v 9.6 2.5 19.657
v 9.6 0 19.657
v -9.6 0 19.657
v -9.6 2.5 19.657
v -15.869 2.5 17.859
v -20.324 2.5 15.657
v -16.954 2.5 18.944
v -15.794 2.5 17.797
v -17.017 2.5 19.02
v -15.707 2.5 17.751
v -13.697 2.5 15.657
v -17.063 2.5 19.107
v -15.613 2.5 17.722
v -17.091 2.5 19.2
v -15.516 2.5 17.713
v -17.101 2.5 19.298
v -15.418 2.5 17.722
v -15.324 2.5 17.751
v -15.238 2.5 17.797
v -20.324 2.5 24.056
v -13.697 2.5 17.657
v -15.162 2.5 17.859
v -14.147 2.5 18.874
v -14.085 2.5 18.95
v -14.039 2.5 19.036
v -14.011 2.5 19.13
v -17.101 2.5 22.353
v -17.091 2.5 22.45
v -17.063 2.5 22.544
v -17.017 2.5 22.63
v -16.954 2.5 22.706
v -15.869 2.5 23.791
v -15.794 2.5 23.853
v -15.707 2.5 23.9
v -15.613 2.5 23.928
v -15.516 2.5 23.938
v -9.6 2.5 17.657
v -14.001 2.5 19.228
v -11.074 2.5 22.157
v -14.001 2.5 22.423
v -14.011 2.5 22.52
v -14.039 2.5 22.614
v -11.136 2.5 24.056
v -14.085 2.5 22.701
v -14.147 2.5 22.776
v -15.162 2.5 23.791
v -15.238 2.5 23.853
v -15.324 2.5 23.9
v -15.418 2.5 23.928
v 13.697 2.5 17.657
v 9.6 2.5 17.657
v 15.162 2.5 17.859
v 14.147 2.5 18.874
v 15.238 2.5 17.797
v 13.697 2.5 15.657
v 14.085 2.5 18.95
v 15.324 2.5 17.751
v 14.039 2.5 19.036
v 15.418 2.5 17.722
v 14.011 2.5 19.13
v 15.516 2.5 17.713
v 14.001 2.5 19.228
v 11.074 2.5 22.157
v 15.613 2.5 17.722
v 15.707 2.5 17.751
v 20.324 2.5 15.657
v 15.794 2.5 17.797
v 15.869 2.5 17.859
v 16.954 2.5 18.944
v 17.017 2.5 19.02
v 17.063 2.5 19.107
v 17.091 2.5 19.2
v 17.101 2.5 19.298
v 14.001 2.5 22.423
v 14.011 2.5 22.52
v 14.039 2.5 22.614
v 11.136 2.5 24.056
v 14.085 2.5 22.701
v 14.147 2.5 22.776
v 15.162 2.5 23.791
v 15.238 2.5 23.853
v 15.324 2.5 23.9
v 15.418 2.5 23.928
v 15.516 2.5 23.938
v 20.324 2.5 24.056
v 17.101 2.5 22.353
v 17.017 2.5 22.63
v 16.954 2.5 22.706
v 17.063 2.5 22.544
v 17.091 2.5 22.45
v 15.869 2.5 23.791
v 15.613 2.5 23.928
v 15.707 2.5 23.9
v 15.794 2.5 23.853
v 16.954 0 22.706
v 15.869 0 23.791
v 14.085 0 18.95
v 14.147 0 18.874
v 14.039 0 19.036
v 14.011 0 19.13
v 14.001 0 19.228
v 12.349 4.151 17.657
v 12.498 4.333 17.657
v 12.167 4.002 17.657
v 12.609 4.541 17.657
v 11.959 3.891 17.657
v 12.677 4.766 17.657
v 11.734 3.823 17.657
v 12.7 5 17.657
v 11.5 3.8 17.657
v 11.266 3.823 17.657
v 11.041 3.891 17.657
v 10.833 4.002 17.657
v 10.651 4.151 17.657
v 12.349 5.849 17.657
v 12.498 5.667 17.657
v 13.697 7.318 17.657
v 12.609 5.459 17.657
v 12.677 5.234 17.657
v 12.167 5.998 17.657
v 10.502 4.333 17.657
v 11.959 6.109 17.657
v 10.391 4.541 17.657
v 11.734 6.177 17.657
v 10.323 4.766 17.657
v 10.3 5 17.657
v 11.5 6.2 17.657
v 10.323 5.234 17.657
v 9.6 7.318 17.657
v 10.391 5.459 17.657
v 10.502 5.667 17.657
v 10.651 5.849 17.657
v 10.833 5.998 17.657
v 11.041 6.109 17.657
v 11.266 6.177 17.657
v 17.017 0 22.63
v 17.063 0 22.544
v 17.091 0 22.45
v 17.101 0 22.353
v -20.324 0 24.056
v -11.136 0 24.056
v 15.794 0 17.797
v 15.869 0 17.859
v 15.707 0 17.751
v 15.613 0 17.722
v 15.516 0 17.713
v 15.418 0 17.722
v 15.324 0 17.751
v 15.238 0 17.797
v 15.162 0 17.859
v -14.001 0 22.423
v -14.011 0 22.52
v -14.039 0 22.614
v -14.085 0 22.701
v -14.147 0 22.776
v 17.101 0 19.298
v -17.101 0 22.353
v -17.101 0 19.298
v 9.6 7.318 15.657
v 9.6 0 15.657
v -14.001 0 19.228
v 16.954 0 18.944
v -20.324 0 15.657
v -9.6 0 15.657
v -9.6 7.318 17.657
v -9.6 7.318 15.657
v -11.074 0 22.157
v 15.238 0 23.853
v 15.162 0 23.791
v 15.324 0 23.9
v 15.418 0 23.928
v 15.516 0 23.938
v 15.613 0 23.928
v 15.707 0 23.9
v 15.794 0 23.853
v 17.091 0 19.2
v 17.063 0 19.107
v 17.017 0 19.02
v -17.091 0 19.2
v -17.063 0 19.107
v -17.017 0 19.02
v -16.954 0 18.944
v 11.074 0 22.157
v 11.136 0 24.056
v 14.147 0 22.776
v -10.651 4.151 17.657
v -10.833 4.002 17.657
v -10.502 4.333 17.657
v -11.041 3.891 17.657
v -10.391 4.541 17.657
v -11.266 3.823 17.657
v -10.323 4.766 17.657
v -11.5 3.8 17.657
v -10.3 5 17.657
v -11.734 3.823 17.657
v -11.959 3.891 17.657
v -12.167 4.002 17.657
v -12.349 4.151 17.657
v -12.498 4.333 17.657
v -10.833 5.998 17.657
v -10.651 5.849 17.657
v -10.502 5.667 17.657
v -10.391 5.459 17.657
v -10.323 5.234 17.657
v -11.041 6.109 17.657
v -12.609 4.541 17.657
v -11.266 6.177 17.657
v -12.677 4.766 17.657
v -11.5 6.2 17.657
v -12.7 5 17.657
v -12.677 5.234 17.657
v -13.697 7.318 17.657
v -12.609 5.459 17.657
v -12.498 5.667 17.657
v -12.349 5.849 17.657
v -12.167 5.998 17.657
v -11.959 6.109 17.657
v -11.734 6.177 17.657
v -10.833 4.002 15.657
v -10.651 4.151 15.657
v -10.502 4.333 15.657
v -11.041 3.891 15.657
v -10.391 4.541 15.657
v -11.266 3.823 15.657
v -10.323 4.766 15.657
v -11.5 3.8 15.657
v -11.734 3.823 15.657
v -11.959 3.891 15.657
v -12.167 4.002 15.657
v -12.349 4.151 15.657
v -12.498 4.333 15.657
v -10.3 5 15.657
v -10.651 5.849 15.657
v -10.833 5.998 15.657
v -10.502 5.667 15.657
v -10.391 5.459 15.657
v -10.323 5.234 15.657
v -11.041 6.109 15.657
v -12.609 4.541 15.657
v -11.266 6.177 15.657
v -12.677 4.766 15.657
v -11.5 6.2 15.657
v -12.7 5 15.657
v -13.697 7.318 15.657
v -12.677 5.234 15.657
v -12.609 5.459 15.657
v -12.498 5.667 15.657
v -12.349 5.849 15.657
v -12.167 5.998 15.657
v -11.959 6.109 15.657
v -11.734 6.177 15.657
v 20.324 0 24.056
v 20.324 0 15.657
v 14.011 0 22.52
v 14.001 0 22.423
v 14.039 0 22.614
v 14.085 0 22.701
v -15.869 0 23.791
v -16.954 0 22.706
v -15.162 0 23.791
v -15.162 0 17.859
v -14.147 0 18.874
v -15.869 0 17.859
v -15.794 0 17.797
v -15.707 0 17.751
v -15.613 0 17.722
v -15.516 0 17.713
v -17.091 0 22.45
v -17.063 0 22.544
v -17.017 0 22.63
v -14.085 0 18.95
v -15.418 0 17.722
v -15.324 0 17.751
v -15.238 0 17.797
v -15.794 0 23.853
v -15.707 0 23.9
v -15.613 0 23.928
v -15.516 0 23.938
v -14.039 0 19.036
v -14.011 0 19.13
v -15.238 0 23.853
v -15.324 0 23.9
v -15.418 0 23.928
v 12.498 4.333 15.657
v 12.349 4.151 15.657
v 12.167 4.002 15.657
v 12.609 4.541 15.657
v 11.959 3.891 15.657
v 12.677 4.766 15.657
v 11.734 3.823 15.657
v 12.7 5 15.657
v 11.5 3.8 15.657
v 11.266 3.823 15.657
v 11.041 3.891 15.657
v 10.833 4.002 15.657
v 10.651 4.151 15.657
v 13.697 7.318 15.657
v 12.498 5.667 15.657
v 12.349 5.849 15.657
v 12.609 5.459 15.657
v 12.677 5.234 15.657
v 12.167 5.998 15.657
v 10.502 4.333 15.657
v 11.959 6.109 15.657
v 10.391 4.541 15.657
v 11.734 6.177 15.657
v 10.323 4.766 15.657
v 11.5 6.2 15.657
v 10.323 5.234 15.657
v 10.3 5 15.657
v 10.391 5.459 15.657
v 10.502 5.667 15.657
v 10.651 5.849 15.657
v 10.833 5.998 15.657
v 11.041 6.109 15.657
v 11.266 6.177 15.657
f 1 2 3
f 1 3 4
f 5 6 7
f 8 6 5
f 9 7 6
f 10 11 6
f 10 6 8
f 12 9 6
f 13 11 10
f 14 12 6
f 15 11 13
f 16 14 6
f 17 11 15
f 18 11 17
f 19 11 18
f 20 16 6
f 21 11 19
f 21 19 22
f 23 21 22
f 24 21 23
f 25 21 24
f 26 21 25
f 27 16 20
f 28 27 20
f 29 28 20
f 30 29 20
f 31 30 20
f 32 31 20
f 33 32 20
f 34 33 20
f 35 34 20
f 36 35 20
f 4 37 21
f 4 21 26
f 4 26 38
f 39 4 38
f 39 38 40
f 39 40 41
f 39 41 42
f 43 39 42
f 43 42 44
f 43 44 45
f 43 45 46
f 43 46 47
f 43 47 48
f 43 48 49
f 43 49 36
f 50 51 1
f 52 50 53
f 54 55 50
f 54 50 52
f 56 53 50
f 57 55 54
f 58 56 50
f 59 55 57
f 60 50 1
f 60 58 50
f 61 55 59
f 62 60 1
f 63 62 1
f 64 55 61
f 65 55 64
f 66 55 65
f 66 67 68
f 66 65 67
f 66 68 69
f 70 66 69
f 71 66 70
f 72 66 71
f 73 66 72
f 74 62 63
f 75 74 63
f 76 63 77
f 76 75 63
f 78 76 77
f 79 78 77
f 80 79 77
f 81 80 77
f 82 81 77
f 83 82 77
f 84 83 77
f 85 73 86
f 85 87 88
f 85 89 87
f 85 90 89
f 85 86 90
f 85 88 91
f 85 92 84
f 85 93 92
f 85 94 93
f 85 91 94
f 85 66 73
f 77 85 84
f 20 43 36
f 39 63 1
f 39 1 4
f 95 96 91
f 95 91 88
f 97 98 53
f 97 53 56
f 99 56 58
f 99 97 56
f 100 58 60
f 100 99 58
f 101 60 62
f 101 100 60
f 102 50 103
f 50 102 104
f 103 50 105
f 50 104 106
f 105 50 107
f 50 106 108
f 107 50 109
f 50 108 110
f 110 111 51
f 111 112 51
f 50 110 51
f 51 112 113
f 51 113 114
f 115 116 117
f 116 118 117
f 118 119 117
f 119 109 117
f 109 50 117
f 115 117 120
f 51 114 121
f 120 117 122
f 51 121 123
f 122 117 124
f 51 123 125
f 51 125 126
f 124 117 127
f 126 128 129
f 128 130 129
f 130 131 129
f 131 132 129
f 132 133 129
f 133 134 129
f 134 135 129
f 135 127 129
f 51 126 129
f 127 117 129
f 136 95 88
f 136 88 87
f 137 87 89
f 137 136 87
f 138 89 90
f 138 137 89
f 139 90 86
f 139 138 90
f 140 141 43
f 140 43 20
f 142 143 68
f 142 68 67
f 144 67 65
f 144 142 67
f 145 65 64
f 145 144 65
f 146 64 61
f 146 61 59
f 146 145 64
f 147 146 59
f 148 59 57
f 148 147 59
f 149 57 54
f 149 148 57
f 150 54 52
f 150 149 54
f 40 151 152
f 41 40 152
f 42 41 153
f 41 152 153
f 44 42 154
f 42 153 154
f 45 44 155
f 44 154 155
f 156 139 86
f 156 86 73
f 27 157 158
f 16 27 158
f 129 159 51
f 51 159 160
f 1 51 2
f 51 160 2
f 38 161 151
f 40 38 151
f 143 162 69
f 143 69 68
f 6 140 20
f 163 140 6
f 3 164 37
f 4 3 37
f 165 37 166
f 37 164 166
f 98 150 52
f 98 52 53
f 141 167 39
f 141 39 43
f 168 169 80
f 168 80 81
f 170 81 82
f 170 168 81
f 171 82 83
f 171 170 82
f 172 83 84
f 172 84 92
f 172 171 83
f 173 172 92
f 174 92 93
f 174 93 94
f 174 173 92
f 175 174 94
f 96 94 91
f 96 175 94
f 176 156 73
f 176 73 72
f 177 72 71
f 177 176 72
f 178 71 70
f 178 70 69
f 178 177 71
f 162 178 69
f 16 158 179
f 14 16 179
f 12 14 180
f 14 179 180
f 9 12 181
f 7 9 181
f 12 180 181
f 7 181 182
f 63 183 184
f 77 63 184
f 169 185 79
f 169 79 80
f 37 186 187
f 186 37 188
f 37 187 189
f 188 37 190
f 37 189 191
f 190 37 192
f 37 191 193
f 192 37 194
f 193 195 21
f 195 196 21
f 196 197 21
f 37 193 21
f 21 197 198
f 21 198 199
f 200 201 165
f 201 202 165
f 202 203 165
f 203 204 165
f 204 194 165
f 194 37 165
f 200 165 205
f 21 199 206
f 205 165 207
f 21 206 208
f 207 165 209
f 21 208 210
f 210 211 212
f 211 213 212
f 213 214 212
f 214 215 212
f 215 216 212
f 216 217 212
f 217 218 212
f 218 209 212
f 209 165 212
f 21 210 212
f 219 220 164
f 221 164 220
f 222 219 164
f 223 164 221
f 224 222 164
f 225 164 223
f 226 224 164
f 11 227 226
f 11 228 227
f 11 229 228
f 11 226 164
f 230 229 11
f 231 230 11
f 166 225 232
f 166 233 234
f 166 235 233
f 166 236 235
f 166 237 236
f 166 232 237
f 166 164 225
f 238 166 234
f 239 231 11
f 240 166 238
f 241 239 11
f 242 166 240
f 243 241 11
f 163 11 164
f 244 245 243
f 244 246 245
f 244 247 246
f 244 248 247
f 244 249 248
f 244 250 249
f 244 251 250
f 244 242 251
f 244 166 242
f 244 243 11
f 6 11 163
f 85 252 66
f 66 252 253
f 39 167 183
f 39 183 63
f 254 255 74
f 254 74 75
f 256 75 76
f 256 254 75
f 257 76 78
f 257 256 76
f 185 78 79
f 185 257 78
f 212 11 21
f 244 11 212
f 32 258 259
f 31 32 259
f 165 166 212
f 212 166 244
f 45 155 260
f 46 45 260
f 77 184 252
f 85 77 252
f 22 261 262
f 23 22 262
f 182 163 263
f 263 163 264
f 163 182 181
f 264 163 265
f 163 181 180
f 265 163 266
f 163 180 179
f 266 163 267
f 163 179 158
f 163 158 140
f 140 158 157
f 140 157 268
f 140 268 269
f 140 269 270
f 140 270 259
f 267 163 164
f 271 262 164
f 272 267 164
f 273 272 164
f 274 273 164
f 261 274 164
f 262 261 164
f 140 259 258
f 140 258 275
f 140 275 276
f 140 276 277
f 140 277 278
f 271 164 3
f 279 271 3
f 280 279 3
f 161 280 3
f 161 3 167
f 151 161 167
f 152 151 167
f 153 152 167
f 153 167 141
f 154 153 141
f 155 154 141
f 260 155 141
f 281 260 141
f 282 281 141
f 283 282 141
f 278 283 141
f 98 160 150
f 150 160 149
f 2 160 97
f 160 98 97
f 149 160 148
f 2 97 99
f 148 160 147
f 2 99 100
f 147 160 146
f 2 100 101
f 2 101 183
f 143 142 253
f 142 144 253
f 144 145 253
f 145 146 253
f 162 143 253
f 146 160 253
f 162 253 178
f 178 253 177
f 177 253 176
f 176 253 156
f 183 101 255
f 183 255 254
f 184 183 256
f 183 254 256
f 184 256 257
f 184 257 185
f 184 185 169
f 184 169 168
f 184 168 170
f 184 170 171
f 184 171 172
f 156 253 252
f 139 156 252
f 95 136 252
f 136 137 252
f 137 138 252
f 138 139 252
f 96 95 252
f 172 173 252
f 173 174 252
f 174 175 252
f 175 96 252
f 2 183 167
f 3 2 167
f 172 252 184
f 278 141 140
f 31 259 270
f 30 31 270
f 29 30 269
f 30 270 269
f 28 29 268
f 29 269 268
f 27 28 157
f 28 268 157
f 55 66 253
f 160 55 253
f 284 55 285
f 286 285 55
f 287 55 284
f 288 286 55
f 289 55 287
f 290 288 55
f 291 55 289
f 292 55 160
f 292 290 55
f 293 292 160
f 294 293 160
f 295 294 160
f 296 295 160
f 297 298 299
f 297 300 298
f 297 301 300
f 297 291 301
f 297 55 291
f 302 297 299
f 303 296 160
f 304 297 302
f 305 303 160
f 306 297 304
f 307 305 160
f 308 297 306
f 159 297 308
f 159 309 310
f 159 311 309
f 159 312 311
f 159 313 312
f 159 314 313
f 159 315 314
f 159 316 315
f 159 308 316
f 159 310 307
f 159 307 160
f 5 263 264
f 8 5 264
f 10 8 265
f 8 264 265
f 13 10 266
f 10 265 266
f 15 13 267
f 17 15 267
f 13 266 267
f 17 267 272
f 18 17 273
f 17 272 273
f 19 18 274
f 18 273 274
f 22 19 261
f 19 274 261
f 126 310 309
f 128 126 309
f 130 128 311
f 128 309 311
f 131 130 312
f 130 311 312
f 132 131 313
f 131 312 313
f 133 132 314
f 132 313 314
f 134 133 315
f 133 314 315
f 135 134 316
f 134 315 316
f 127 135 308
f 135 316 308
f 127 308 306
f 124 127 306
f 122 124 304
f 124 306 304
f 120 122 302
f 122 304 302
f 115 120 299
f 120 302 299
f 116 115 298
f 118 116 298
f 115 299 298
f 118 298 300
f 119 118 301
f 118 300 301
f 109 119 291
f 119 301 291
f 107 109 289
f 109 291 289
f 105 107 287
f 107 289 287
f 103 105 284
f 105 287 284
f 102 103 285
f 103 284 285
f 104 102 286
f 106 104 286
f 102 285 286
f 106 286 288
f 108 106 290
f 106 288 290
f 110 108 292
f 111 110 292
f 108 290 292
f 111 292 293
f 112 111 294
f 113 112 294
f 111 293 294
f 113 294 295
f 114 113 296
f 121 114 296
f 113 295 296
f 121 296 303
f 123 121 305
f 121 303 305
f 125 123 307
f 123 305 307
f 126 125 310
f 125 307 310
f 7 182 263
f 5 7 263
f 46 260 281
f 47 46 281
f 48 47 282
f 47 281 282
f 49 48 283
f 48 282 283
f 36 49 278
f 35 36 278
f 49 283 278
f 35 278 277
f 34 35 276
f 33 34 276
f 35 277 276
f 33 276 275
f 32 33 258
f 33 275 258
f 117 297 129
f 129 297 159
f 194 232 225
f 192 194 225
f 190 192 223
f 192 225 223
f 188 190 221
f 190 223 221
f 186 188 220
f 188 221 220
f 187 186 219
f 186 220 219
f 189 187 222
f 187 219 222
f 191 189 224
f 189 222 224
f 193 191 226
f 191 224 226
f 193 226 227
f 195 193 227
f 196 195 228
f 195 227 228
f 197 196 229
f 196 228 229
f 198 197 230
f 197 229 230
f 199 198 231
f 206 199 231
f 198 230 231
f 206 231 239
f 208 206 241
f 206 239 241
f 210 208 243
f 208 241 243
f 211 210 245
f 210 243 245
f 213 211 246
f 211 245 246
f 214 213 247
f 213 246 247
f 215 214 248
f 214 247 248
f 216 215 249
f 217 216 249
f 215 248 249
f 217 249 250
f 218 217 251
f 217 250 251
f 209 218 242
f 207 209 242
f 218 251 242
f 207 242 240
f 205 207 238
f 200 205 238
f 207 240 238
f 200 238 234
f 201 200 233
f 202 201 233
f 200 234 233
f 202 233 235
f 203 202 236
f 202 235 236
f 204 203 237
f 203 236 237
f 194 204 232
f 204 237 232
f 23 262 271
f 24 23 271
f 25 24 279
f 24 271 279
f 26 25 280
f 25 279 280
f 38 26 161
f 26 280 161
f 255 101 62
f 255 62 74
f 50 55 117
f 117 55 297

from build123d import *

# Parameters (mm, degrees)
EXTRUDE_1728_DEPTH   = 2.5
EXTRUDE_1728_2_DEPTH = 2.5
SKETCH_3_W           = 4.096784854
SKETCH_3_H           = 4.817676116
SKETCH_3_R           = 1.2
EXTRUDE_1_DEPTH      = 2
EXTRUDE_2_REACH      = 41.086
SKETCH_5_W           = 2.5
SKETCH_5_H           = 2.5


with BuildPart() as part:
    # 草图2 → Extrude 1728 (new body)
    with BuildSketch(Plane(origin=(0, 0, 0), x_dir=(1, 0, 0), z_dir=(0, 1, 0))):
        Polygon((11.136061282, -24.056246494), (20.323880385, -24.056246494), (20.323880385, -15.656749138), (17.100927376, -15.656749138), (14.000927376, -15.656749138), (10.862052049, -15.656749138), (9.6, -15.656749138), (9.6, -22.156749138), (11.073569208, -22.156749138), align=None)
        with BuildLine():
            Line((14.000927376, -19.227513168), (14.000927376, -22.422888537))
            ThreePointArc((14.000927376, -22.422888537), (14.03898761, -22.614230253), (14.147373985, -22.776441927))
            Line((14.147373985, -22.776441927), (15.162186301, -23.791254243))
            ThreePointArc((15.162186301, -23.791254243), (15.515739691, -23.937700852), (15.869293082, -23.791254243))
            Line((15.869293082, -23.791254243), (16.954480766, -22.706066558))
            ThreePointArc((16.954480766, -22.706066558), (17.062867142, -22.543854884), (17.100927376, -22.352513168))
            Line((17.100927376, -22.352513168), (17.100927376, -19.297888537))
            ThreePointArc((17.100927376, -19.297888537), (17.062867142, -19.10654682), (16.954480766, -18.944335146))
            Line((16.954480766, -18.944335146), (15.869293082, -17.859147462))
            ThreePointArc((15.869293082, -17.859147462), (15.515739691, -17.712700852), (15.162186301, -17.859147462))
            Line((15.162186301, -17.859147462), (14.147373985, -18.873959777))
            ThreePointArc((14.147373985, -18.873959777), (14.03898761, -19.036171452), (14.000927376, -19.227513168))
        make_face(mode=Mode.SUBTRACT)
    extrude(amount=EXTRUDE_1728_DEPTH)



with BuildPart() as body_2:
    # 草图2 → Extrude 1728 2 (new body)
    with BuildSketch(Plane(origin=(0, 0, 0), x_dir=(1, 0, 0), z_dir=(0, 1, 0))):
        Polygon((-11.136061282, -24.056246494), (-20.323880385, -24.056246494), (-20.323880385, -15.656749138), (-17.100927376, -15.656749138), (-14.000927376, -15.656749138), (-10.862052049, -15.656749138), (-9.6, -15.656749138), (-9.6, -22.156749138), (-11.073569208, -22.156749138), align=None)
        with BuildLine():
            Line((-14.000927376, -19.227513168), (-14.000927376, -22.422888537))
            ThreePointArc((-14.000927376, -22.422888537), (-14.03898761, -22.614230253), (-14.147373985, -22.776441927))
            Line((-14.147373985, -22.776441927), (-15.162186301, -23.791254243))
            ThreePointArc((-15.162186301, -23.791254243), (-15.515739691, -23.937700852), (-15.869293082, -23.791254243))
            Line((-15.869293082, -23.791254243), (-16.954480766, -22.706066558))
            ThreePointArc((-16.954480766, -22.706066558), (-17.062867142, -22.543854884), (-17.100927376, -22.352513168))
            Line((-17.100927376, -22.352513168), (-17.100927376, -19.297888537))
            ThreePointArc((-17.100927376, -19.297888537), (-17.062867142, -19.10654682), (-16.954480766, -18.944335146))
            Line((-16.954480766, -18.944335146), (-15.869293082, -17.859147462))
            ThreePointArc((-15.869293082, -17.859147462), (-15.515739691, -17.712700852), (-15.162186301, -17.859147462))
            Line((-15.162186301, -17.859147462), (-14.147373985, -18.873959777))
            ThreePointArc((-14.147373985, -18.873959777), (-14.03898761, -19.036171452), (-14.000927376, -19.227513168))
        make_face(mode=Mode.SUBTRACT)
    extrude(amount=EXTRUDE_1728_2_DEPTH)


with BuildPart() as part_1:
    add(part.part)

    add(body_2.part)  # 凸台-拉伸1 merges body 2
    # 草图3 → 凸台-拉伸1 (add)
    # profile 1 of 2: a face of its own
    with BuildSketch(Plane(origin=(0, 0, 15.656749138), x_dir=(-1, 0, 0), z_dir=(0, 0, -1))):
        with Locations((-11.648392427, 4.908838058)):
            Rectangle(SKETCH_3_W, SKETCH_3_H)
        with Locations((-11.5, 5)):
            Circle(SKETCH_3_R, mode=Mode.SUBTRACT)
    # profile 2 of 2: a face of its own
    with BuildSketch(Plane(origin=(0, 0, 15.656749138), x_dir=(-1, 0, 0), z_dir=(0, 0, -1))):
        with Locations((11.648392427, 4.908838058)):
            Rectangle(SKETCH_3_W, SKETCH_3_H)
        with Locations(Location((11.5, 5, 0), (0, 0, 180))):
            Circle(SKETCH_3_R, mode=Mode.SUBTRACT)
    extrude(amount=-EXTRUDE_1_DEPTH)

    # 草图5 → 凸台-拉伸2 (add, up to next)
    with BuildSketch(Plane.ZY.offset(-9.6), mode=Mode.PRIVATE) as extrude_2_sk1:
        with Locations((20.906749138, 1.25)):
            Rectangle(SKETCH_5_W, SKETCH_5_H)
    extrude_2_tool1 = extrude(extrude_2_sk1.sketch, amount=EXTRUDE_2_REACH, mode=Mode.PRIVATE) - part_1.part
    add(extrude_2_tool1.solids().sort_by_distance((9.6, 1.25, 20.906749))[0])


solid = part_1.part
